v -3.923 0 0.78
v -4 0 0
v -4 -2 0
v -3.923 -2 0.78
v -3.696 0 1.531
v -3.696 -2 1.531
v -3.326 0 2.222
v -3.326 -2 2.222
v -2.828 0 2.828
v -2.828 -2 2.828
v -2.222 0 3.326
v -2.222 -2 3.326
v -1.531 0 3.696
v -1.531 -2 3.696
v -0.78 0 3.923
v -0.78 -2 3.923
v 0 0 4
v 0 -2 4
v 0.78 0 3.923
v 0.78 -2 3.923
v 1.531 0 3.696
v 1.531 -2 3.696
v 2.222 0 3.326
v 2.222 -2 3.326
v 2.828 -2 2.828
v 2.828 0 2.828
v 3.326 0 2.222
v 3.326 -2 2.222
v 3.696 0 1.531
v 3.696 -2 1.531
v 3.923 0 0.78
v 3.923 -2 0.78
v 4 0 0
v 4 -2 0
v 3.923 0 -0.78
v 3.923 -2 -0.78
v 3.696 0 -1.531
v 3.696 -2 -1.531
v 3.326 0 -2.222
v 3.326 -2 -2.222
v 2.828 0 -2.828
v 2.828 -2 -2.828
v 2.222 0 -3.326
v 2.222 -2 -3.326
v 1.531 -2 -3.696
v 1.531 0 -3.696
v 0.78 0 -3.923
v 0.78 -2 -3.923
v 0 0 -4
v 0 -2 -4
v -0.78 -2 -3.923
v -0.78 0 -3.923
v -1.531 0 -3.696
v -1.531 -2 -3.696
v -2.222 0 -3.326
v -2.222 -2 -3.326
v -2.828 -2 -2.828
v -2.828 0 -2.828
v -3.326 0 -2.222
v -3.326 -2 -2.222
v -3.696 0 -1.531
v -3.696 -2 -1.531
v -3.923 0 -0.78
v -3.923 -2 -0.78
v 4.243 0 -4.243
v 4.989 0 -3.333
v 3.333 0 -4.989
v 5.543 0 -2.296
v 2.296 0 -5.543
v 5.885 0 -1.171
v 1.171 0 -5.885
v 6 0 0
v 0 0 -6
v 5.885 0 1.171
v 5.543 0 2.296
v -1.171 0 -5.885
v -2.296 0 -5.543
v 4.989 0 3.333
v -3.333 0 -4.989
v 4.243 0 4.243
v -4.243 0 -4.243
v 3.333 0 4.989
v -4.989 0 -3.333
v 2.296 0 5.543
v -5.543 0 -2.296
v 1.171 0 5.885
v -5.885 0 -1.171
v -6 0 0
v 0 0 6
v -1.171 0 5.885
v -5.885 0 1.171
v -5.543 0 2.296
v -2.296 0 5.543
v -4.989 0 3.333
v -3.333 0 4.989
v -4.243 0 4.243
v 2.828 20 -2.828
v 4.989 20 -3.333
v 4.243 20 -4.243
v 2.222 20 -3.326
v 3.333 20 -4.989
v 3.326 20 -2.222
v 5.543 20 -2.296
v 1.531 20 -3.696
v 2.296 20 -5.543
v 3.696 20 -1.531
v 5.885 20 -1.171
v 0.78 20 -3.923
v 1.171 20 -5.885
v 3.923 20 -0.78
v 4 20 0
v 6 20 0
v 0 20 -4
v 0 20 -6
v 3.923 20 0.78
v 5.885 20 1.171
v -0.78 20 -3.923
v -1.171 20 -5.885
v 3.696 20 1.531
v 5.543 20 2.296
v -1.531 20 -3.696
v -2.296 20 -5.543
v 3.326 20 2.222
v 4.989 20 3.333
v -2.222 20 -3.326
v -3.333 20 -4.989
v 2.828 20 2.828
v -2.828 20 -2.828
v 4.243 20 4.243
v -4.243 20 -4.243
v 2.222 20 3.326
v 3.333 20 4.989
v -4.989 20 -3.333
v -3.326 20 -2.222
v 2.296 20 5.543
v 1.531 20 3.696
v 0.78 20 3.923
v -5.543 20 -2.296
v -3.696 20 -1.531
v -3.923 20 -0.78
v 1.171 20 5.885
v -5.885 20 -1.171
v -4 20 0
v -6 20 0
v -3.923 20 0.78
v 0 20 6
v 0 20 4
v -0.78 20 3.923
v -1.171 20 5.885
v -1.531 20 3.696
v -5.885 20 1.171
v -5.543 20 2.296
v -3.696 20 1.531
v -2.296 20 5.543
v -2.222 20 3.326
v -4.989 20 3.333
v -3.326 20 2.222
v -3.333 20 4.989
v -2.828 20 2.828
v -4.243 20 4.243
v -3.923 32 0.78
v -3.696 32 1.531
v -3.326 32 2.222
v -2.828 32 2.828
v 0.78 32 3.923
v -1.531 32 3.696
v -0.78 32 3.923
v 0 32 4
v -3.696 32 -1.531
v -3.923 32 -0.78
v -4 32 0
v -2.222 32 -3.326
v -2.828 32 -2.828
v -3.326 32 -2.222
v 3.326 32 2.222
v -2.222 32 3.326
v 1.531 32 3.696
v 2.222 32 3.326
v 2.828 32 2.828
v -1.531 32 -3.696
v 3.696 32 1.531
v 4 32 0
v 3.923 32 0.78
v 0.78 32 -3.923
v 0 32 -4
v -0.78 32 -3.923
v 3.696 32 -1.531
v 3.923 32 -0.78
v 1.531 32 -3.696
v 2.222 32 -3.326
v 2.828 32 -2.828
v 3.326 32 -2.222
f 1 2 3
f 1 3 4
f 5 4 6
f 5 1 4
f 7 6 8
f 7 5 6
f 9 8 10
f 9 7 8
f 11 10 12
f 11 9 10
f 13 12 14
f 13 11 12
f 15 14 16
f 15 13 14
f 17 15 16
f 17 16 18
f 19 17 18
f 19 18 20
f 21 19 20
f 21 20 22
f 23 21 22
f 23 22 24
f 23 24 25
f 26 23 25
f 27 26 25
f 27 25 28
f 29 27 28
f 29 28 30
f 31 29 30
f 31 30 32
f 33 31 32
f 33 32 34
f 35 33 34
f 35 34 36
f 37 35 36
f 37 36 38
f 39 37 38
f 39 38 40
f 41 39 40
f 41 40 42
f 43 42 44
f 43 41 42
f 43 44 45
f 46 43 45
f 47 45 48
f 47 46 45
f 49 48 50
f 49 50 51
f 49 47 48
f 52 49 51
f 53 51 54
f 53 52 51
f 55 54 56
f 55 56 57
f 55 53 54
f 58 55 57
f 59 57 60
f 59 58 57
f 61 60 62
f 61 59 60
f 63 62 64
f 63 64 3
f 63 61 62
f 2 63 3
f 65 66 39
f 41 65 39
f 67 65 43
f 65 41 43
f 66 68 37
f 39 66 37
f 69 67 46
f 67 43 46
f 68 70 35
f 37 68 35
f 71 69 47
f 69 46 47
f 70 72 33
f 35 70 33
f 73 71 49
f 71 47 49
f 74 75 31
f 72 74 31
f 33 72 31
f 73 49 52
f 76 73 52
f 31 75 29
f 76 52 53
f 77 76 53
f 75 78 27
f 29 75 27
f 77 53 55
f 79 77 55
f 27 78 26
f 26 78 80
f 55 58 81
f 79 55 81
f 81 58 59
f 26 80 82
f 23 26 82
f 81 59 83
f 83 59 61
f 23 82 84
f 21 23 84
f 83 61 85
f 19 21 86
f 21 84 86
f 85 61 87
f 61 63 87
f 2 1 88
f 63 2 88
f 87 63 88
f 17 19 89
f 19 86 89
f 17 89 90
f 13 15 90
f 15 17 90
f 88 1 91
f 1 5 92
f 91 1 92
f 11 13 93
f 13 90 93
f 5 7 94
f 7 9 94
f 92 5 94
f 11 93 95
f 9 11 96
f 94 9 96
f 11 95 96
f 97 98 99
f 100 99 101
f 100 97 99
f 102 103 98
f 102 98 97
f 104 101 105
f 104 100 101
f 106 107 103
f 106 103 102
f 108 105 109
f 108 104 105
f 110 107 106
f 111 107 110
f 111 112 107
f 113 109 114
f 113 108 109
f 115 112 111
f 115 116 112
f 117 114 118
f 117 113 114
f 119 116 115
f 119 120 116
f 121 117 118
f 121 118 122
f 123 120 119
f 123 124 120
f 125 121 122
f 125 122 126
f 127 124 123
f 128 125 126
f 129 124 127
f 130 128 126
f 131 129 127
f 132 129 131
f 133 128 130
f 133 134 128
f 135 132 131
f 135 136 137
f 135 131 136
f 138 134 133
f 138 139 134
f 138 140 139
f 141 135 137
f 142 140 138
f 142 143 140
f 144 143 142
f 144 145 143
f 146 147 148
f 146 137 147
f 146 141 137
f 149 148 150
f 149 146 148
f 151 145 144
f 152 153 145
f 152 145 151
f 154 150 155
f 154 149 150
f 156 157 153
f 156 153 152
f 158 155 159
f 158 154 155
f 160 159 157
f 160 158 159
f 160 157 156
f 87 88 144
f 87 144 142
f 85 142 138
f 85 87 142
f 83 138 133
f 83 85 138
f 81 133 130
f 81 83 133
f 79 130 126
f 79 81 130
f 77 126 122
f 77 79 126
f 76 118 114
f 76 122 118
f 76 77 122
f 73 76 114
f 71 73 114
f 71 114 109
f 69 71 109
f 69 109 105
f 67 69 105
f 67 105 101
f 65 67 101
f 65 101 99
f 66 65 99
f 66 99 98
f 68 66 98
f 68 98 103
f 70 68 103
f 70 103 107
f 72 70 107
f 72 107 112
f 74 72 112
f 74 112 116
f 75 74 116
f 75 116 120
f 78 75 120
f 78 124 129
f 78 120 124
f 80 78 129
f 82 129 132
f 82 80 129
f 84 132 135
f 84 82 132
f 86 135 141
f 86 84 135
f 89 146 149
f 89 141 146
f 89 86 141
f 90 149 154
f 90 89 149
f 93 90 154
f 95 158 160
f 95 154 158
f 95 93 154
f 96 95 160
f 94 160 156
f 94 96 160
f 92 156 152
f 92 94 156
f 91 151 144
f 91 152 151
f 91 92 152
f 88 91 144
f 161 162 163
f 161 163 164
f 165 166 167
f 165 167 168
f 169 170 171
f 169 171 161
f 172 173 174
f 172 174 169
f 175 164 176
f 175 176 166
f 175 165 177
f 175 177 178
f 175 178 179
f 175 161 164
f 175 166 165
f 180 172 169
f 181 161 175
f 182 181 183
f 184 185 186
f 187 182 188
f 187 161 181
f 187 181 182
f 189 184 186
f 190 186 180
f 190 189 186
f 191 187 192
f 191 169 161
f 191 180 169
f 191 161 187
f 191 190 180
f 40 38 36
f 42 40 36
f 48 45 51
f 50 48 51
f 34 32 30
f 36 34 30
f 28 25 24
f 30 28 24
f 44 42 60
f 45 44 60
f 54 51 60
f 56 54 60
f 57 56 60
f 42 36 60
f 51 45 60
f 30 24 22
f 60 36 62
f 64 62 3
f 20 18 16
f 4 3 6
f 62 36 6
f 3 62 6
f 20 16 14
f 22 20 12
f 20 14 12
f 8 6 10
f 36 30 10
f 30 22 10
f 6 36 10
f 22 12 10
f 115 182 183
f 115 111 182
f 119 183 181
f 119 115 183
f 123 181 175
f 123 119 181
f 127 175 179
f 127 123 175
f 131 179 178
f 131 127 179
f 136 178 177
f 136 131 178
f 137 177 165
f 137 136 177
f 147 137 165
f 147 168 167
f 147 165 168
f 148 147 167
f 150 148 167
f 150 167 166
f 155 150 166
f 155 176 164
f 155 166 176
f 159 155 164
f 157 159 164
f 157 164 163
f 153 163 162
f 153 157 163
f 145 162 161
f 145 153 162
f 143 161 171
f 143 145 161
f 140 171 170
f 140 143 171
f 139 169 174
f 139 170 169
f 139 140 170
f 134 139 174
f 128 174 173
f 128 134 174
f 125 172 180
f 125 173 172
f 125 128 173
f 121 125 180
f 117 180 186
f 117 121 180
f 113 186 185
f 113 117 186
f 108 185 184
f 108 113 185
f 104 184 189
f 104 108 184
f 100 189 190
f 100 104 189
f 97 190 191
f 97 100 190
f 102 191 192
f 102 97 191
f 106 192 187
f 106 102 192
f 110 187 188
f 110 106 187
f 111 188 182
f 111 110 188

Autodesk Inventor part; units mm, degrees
ref_plane "YZ Plane" through (0, 0, 0) normal (1, 0, 0) x (0, 1, 0)
ref_plane "XZ Plane" through (0, 0, 0) normal (0, 1, 0) x (-1, 0, 0)
ref_plane "XY Plane" through (0, 0, 0) normal (0, 0, 1) x (1, 0, 0)
sketch "Sketch2" plane through (0, 0, 0) normal (0, 1, 0) x (-1, 0, 0)
  circle A0 centre (0, 0) radius 4
  circle A1 centre (0, 0) radius 6
  dimension "d4" = 8
  dimension "d5" = 12
extrude "Extrusion2" add sketch "Sketch2" along normal blind 20 contours A0 | A1
extrude "Extrusion3" add sketch "Sketch2" against normal blind 2 contours A0
sketch "Sketch3" plane through (0, 20, 0) normal (0, 1, 0) x (1, 0, 0)
  circle A0 centre (0, 0) radius 4 projected
extrude "Extrusion4" add sketch "Sketch3" along normal blind 12
properties part number "springStub"
